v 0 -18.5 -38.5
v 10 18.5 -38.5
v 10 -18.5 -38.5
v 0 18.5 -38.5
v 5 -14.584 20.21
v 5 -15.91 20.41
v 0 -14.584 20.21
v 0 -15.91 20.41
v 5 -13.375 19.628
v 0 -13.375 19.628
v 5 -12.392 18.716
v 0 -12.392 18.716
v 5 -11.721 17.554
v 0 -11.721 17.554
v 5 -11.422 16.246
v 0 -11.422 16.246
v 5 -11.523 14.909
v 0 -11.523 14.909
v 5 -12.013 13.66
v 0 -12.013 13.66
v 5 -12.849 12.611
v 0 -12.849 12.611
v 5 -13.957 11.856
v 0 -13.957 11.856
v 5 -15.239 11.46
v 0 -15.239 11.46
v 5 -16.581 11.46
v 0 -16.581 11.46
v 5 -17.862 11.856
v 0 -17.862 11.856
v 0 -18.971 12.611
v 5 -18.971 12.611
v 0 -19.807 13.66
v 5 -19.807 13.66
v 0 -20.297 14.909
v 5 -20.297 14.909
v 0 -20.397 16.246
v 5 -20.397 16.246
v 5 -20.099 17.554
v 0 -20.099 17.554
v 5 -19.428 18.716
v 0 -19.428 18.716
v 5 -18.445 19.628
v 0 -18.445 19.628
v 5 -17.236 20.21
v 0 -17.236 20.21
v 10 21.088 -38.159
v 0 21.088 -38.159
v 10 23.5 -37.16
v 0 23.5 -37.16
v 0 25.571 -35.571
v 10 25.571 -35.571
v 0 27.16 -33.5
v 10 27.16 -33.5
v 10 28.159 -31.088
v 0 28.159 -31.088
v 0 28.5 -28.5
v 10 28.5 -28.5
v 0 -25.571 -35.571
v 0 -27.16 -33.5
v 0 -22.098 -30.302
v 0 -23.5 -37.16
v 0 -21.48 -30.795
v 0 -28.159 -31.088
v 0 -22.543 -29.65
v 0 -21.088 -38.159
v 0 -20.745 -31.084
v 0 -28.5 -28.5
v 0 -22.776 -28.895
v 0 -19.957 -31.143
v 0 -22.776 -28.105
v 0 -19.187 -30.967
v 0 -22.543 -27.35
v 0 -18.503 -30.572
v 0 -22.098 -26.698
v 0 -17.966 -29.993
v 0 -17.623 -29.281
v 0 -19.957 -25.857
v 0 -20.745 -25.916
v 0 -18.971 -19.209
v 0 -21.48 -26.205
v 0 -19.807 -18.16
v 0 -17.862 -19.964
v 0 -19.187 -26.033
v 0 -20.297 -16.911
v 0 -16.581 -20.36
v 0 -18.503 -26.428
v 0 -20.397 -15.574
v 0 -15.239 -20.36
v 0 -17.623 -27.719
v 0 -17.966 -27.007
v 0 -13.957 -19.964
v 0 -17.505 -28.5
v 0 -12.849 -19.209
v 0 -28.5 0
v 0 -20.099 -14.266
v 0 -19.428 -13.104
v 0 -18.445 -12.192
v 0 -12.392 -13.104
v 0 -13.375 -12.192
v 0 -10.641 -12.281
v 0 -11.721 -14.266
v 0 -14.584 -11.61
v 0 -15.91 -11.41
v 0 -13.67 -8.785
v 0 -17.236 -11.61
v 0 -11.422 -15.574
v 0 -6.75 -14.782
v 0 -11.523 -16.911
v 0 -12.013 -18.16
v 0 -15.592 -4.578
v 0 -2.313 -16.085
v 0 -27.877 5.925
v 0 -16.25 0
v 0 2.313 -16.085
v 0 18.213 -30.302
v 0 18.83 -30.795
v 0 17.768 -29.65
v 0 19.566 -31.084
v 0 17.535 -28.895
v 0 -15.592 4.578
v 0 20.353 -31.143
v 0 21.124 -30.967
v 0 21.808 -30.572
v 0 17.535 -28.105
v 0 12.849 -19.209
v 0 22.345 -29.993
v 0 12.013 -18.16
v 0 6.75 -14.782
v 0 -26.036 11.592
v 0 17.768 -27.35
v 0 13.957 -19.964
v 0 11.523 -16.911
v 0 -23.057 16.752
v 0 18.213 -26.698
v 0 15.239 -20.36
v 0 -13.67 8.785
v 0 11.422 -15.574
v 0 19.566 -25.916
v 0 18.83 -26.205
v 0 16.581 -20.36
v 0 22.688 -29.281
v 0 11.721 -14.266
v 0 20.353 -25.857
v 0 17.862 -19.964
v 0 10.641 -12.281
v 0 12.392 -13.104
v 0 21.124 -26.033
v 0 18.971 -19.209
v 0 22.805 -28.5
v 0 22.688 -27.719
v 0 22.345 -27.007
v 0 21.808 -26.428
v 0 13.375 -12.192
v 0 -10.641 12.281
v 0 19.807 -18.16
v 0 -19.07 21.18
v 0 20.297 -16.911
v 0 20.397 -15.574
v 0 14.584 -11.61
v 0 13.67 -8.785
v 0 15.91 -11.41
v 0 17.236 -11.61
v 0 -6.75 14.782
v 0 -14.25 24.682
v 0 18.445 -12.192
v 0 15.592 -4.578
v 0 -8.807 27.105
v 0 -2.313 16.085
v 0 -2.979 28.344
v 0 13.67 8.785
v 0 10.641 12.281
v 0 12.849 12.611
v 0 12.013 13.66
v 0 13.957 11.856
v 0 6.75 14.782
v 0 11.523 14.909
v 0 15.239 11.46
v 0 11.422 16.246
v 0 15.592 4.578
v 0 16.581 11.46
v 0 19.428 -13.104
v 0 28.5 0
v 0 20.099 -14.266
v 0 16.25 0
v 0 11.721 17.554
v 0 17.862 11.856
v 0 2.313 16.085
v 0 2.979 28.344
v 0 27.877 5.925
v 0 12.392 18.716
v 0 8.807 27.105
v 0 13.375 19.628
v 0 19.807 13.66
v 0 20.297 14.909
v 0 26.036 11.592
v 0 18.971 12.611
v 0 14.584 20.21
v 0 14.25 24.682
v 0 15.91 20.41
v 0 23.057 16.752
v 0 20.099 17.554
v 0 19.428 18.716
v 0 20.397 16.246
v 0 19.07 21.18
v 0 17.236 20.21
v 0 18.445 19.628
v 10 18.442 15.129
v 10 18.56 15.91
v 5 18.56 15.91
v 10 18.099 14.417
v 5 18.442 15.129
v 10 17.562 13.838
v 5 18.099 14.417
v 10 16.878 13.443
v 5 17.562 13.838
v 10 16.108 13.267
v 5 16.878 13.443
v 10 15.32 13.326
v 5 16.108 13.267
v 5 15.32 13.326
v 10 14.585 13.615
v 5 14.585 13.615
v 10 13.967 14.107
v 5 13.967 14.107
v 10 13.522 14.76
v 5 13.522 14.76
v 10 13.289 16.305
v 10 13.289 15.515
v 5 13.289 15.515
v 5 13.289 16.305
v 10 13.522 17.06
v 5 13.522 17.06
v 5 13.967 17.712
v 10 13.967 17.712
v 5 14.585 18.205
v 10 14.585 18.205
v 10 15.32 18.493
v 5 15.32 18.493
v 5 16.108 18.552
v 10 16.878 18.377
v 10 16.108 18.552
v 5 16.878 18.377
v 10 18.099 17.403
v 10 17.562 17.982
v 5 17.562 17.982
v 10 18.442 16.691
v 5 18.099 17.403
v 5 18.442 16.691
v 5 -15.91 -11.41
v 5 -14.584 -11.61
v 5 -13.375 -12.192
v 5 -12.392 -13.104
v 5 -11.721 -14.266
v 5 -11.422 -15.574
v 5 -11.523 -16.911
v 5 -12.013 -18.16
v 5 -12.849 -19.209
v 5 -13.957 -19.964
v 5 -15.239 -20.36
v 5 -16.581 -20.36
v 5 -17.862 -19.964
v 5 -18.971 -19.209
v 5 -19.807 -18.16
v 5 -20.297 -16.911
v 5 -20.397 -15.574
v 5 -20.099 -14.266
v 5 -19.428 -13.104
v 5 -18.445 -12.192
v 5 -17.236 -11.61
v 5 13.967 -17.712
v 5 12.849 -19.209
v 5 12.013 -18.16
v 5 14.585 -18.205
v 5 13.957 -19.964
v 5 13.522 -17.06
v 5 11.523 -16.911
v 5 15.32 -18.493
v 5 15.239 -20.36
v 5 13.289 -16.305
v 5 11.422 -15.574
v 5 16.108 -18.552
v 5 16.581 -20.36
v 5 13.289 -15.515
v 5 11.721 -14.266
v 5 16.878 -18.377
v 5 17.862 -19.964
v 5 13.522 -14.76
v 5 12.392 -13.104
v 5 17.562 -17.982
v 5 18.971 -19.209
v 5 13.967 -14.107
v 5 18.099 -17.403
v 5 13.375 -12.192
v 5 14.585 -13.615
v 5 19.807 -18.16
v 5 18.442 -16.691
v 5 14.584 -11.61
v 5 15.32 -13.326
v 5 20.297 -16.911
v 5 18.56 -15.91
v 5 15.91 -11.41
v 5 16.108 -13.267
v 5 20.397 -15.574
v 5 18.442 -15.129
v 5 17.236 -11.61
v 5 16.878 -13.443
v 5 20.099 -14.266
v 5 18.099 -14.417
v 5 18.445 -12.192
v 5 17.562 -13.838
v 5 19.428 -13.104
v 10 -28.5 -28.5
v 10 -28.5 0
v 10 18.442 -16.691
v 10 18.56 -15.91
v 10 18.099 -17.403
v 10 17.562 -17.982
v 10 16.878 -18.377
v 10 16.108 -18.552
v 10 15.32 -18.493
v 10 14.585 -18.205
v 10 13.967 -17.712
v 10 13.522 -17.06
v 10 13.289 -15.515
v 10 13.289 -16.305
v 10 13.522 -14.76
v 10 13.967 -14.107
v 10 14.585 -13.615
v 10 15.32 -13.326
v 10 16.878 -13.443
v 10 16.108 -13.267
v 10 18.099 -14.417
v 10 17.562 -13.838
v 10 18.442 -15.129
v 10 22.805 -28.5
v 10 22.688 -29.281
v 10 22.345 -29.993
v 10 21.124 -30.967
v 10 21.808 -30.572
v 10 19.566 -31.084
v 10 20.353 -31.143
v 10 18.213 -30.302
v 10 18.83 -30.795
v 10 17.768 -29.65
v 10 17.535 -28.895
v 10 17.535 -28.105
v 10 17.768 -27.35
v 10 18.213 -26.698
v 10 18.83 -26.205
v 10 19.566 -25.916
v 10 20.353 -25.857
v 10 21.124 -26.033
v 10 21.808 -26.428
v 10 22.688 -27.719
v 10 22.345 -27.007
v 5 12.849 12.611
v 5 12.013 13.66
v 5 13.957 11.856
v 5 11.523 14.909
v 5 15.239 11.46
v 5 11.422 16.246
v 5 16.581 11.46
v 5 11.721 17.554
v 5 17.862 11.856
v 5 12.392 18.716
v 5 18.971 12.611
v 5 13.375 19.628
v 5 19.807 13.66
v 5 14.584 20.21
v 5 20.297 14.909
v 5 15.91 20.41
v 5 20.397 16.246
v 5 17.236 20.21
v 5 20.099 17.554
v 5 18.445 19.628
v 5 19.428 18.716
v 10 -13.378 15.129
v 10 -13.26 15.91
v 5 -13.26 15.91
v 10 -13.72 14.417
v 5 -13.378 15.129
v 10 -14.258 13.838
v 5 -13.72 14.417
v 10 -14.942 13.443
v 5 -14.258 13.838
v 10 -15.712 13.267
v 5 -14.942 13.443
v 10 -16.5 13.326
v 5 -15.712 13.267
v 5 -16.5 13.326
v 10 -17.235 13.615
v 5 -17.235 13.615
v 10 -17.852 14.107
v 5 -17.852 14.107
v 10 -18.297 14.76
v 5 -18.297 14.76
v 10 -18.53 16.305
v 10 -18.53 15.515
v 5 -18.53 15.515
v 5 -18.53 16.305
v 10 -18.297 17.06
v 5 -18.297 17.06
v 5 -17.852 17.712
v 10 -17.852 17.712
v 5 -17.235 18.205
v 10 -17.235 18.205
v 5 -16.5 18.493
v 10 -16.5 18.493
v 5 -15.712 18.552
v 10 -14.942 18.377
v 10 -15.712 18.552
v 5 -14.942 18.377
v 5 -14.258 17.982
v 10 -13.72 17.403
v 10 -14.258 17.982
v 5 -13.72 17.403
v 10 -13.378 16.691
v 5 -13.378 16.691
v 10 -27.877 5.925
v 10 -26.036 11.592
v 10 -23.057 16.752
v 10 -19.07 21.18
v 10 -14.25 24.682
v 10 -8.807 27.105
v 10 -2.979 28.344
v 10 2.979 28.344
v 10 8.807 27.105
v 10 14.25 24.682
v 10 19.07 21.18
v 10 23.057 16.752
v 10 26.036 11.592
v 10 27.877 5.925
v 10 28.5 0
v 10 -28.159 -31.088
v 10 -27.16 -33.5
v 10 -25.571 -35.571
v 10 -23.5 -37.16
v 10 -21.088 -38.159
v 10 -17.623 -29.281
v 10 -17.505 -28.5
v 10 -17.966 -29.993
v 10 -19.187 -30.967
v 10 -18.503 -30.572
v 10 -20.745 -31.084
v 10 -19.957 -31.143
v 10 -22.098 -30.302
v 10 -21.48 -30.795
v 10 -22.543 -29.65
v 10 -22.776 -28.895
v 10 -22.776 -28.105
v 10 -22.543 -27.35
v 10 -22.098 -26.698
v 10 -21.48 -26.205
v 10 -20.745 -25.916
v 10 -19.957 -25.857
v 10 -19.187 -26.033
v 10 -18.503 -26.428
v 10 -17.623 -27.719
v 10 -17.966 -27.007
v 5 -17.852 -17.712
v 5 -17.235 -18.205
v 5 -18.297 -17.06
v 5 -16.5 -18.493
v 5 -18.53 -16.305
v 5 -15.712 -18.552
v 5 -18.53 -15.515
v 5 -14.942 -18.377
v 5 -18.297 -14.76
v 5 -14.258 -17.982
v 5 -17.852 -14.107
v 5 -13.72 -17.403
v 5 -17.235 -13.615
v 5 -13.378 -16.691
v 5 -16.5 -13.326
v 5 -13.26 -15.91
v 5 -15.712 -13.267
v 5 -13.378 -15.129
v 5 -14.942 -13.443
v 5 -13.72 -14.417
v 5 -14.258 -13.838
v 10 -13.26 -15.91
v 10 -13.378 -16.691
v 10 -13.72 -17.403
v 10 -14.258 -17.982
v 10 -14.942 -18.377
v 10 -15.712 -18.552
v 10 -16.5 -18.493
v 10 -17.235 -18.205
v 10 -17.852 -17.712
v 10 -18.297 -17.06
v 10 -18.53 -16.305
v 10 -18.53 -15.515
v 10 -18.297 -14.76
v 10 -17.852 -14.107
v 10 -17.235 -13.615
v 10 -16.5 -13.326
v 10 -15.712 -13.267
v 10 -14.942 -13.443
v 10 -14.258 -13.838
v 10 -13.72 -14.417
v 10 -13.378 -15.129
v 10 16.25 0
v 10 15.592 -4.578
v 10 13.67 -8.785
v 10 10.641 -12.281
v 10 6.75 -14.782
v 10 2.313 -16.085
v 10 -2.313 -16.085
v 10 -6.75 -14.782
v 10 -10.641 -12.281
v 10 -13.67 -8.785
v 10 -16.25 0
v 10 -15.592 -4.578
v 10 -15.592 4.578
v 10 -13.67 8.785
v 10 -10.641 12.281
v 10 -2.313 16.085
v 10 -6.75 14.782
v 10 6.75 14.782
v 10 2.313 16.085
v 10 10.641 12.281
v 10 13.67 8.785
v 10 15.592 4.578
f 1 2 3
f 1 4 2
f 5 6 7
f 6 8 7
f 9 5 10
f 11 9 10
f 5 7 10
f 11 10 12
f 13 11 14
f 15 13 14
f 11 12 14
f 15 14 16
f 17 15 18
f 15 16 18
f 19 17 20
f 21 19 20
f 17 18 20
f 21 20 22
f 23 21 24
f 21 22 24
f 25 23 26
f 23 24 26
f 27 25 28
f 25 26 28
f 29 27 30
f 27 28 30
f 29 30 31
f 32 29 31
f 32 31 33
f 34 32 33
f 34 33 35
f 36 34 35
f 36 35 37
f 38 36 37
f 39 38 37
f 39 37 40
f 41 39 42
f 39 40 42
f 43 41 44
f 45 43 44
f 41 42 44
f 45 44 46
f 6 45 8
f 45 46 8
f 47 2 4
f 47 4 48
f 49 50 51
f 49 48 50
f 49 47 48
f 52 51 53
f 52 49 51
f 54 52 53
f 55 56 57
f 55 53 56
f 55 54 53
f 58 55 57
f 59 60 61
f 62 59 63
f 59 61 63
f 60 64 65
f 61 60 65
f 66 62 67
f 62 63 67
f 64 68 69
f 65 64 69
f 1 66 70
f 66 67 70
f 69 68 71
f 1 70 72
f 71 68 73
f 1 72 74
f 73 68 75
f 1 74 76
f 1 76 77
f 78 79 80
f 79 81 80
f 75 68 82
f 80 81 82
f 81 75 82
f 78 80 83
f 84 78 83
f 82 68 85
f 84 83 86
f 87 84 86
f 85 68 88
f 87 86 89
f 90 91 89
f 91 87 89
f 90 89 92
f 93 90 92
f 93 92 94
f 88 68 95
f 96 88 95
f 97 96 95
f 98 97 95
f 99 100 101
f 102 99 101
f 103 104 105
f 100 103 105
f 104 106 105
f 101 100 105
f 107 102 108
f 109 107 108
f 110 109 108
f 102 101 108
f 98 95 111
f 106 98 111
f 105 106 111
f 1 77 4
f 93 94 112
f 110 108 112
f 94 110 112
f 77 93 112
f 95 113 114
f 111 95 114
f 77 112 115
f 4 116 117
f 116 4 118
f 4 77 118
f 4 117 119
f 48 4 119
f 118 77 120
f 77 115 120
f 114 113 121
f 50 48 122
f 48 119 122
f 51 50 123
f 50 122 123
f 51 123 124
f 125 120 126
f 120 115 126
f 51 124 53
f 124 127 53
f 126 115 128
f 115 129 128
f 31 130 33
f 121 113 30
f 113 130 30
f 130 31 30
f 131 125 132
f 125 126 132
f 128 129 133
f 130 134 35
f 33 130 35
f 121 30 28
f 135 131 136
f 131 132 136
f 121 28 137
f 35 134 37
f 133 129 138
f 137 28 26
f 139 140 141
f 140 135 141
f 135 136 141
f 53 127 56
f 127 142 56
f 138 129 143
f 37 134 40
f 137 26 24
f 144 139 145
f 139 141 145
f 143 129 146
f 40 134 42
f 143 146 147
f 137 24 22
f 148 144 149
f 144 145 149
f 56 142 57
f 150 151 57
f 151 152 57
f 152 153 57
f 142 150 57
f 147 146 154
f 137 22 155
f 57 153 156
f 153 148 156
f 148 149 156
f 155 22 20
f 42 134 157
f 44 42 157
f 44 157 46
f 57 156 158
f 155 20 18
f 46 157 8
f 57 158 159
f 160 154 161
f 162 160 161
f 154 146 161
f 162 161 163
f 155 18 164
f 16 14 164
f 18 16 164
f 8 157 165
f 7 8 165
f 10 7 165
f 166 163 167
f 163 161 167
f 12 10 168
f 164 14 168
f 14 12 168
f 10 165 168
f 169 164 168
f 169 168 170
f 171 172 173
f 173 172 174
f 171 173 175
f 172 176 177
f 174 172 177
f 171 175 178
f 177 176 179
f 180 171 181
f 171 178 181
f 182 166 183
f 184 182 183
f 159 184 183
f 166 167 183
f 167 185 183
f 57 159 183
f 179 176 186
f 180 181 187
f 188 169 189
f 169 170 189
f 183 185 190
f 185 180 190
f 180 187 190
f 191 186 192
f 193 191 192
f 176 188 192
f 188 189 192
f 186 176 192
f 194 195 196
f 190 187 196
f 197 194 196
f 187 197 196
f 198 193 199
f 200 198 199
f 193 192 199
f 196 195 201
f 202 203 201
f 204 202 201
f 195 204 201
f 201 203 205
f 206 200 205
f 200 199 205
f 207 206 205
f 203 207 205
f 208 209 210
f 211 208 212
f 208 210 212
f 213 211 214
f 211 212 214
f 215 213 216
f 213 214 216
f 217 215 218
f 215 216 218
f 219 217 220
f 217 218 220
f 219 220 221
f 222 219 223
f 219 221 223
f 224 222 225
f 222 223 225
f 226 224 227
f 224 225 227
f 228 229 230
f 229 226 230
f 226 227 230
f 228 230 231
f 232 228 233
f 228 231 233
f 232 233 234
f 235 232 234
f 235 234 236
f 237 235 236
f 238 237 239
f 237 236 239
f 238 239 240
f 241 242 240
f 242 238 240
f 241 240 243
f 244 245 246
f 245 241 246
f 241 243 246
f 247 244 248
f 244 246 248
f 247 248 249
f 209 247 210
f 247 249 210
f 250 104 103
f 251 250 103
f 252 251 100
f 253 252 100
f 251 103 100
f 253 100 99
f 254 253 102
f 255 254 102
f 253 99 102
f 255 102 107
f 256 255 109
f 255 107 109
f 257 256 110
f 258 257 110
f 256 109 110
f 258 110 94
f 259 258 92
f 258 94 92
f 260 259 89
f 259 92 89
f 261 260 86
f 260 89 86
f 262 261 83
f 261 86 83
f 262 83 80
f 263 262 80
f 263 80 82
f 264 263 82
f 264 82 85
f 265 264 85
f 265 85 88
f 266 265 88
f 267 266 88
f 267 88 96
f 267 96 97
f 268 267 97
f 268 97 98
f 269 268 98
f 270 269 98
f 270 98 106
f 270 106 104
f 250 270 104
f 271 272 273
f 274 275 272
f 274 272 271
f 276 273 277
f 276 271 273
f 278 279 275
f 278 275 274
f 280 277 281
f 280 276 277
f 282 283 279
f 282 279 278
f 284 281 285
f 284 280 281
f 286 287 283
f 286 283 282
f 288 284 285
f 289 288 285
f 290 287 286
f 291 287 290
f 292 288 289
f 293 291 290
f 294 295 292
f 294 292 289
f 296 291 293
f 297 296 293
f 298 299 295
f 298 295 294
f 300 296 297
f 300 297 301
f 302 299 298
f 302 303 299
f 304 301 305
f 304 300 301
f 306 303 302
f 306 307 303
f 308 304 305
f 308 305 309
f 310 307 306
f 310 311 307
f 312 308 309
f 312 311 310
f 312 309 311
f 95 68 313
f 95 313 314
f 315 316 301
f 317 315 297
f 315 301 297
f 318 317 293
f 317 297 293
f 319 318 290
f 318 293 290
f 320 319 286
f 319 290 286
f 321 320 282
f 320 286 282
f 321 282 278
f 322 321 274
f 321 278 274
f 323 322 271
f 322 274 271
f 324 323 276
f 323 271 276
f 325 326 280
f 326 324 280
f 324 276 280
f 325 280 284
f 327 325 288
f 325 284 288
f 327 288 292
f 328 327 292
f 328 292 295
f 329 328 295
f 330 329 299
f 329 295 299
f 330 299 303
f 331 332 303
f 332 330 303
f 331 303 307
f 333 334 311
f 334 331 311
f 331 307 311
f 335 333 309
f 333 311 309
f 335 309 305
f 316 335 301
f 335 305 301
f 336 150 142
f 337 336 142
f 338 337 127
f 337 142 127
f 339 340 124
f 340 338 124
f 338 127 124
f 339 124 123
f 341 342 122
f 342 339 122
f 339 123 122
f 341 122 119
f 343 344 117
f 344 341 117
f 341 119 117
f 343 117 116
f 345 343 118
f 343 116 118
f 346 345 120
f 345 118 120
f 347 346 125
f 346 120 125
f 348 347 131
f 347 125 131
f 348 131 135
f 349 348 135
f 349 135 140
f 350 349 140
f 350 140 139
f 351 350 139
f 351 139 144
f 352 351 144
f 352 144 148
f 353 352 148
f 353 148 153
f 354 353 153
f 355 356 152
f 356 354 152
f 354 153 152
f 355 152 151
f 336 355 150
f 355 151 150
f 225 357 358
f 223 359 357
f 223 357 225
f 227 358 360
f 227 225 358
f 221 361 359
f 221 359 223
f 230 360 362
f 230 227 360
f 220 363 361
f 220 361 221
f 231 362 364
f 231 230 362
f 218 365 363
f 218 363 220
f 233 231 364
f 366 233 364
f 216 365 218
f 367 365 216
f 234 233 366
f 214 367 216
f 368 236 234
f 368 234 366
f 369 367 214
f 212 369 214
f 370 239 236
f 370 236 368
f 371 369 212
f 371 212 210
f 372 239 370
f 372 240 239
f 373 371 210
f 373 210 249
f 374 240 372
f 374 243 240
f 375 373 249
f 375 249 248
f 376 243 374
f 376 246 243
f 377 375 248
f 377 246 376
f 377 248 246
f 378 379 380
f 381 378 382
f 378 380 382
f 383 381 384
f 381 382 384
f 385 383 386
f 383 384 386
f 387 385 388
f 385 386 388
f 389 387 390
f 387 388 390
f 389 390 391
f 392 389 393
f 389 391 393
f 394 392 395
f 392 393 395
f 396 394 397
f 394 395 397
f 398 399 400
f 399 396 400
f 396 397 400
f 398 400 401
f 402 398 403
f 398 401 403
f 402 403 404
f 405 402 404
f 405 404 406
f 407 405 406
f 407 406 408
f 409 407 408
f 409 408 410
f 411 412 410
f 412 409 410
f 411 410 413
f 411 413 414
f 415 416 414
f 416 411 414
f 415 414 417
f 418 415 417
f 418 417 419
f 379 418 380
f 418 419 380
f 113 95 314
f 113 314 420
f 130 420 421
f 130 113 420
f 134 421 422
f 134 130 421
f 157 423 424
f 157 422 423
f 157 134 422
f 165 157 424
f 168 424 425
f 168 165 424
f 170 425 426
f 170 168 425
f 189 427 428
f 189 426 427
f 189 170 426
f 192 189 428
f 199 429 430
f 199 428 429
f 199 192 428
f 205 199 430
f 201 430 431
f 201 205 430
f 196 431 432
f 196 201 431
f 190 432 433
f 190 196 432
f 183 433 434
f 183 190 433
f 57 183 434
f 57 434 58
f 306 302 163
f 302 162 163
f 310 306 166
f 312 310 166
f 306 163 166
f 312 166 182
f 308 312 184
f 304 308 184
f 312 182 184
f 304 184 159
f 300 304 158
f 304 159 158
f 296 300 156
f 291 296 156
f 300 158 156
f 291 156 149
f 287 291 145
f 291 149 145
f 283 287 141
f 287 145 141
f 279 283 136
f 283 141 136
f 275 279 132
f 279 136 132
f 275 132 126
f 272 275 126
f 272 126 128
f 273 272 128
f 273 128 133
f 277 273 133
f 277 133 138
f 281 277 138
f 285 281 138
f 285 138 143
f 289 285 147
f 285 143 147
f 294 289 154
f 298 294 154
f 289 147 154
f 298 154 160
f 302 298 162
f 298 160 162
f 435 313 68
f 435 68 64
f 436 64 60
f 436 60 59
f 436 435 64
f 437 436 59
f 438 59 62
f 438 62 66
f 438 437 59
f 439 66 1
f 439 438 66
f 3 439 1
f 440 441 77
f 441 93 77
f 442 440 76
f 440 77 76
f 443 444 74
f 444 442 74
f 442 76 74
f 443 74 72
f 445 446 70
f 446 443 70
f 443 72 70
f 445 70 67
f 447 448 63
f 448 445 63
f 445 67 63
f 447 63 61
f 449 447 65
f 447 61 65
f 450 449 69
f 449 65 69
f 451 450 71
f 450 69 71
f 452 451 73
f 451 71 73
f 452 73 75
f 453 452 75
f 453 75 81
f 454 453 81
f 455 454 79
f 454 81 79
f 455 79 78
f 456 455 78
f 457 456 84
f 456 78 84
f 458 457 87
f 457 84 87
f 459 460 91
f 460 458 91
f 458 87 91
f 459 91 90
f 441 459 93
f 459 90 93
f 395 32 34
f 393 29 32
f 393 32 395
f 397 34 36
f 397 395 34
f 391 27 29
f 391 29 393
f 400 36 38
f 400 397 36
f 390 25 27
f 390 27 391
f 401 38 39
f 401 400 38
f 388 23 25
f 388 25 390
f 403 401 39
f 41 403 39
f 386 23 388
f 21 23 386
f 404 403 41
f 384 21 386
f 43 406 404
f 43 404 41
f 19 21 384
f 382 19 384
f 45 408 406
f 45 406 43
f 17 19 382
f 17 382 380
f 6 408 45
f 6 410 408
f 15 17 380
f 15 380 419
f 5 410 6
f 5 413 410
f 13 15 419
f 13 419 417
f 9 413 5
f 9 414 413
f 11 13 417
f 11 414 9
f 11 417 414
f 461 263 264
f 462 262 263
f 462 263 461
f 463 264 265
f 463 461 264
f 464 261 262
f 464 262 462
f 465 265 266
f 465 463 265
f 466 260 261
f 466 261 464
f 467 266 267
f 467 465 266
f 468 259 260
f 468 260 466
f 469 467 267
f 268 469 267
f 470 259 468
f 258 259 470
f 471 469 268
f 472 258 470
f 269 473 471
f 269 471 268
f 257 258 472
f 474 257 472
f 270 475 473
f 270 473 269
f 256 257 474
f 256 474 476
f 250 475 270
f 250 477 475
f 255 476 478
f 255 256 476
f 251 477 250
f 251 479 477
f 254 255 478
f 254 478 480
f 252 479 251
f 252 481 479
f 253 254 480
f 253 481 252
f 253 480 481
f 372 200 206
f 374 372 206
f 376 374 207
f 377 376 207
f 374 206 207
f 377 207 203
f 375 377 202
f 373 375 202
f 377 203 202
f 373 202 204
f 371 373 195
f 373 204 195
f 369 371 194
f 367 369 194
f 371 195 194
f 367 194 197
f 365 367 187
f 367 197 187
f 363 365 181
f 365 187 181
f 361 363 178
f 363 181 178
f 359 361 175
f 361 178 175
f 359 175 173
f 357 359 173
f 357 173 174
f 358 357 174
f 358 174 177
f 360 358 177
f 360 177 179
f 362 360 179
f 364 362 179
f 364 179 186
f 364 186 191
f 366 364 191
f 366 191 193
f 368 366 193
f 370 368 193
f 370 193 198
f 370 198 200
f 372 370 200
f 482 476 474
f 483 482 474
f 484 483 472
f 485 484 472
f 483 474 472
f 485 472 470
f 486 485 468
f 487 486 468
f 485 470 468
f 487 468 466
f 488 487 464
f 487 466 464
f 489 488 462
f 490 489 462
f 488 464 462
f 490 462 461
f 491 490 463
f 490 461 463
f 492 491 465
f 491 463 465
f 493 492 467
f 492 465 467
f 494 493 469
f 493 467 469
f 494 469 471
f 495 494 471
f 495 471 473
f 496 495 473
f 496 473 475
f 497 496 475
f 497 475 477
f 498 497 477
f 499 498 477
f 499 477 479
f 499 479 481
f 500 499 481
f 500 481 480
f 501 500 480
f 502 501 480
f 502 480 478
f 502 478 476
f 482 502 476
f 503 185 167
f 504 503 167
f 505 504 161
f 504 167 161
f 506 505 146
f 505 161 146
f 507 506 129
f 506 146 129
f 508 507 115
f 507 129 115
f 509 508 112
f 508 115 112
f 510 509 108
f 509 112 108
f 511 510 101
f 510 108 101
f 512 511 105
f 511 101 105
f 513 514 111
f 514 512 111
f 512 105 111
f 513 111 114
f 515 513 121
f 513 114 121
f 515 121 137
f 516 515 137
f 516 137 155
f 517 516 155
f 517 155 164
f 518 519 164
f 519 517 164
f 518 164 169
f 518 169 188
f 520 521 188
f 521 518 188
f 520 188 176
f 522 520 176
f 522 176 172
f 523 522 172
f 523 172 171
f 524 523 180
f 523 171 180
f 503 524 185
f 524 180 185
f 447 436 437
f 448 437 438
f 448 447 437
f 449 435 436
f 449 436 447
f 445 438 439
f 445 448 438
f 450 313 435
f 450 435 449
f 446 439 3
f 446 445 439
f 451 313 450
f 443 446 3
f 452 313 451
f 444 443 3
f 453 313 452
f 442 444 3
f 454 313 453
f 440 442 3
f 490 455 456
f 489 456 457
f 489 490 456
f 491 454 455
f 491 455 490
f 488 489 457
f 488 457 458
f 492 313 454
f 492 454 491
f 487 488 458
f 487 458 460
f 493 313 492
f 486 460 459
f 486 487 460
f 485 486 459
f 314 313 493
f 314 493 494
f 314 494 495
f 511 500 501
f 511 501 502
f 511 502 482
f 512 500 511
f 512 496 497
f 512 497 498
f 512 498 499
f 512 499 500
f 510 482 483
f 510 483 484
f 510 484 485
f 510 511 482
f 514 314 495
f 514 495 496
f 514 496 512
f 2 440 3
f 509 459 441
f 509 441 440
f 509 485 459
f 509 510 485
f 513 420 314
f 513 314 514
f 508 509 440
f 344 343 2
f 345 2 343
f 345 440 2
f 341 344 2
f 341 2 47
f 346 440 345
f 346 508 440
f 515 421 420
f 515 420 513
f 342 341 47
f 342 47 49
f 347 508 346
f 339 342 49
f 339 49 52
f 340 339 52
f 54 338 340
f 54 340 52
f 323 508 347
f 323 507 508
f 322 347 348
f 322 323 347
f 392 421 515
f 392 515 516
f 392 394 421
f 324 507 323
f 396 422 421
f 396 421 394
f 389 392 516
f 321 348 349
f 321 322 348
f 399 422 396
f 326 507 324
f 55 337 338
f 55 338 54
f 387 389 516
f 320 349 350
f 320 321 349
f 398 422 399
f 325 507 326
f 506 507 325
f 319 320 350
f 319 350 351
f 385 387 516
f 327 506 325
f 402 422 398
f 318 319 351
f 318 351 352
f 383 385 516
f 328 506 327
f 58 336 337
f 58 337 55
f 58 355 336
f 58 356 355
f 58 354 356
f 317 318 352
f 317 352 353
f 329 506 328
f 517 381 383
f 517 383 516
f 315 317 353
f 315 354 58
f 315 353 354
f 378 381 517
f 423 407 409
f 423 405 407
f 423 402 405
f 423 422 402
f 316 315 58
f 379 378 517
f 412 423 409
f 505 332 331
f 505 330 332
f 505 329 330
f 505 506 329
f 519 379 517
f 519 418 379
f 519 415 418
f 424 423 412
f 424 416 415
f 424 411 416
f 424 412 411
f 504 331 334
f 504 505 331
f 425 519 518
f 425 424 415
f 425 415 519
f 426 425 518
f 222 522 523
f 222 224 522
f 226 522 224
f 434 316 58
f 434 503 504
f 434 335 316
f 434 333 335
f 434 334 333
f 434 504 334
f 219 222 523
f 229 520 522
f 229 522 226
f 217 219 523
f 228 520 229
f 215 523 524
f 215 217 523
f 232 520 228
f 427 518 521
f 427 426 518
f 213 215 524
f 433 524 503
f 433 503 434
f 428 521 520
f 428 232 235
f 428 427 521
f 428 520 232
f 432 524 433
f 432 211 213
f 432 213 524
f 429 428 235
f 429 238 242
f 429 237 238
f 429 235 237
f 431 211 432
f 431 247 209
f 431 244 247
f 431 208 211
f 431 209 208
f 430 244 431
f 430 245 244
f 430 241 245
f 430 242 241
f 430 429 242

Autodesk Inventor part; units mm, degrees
ref_plane "YZ Plane" through (0, 0, 0) normal (1, 0, 0) x (0, 1, 0)
ref_plane "XZ Plane" through (0, 0, 0) normal (0, 1, 0) x (-1, 0, 0)
ref_plane "XY Plane" through (0, 0, 0) normal (0, 0, 1) x (1, 0, 0)
sketch "Sketch1" plane through (0, 0, 0) normal (1, 0, 0) x (0, 1, 0)
  circle A0 centre (0, 0) radius 22.5 construction
  circle A1 centre (0, 0) radius 16.25
  circle A2 centre (0, 0) radius 28.5
  circle A3 centre (15.9099, 15.9099) radius 2.65
  line L0 (15.9099, 15.9099) -> (0, 0) construction
  circle A4 centre (-15.9099, 15.9099) radius 2.65
  circle A5 centre (-15.9099, -15.9099) radius 2.65
  circle A6 centre (15.9099, -15.9099) radius 2.65
  line L1 (28.5, 0) -> (28.5, -38.5)
  line L2 (28.5, -38.5) -> (-28.5, -38.5)
  line L3 (-28.5, -38.5) -> (-28.5, 0)
  line L4 (28.5, -18.5) -> (-28.5, -18.5)
  line L5 (-28.5, -28.5) -> (-20.1554, -28.5) construction
  line L6 (-20.1554, -28.5) -> (-11.8108, -28.5) construction
  line L7 (20.1554, -28.5) -> (28.5, -28.5) construction
  circle A7 centre (20.1554, -28.5) radius 2.65
  circle A8 centre (-20.1554, -28.5) radius 2.65
  line L8 (0, 0) -> (0, 13.3225) construction
  line L9 (-28.5, -28.5) -> (-20.1554, -28.5) construction
  line L10 (20.1554, -28.5) -> (16.456, -23.2691) construction
  point P0 (-17.3108, 22.6404)
  point P1 (-26.3306, -10.9065)
  point P2 (28.5, 0)
  dimension "d0" = 45
  dimension "d1" = 32.5
  dimension "d2" = 57
  dimension "d3" = 5.3
  dimension "d6" = 360
  dimension "d12" = 20
  dimension "d22" = 5.3
  dimension "d23" = 10
  dimension "d24" = 45
  dimension "d27" = 10
  dimension "d28" = 8.3446
extrude "Extrusion1" add sketch "Sketch1" along normal blind 10 contours A2 L4 A6 A5 | L1 L4 A2 | A2 L4 L3 | L4 L1 L2 L3 A2 | A2 L4 A5 A6
fillet "Fillet1" radius 10 4 edges at (5, 28.5, -38.5) (5, -28.5, -38.5) (5, -28.5, 0) (5, 28.5, 0)
sketch "Sketch2" plane through (0, 0, 0) normal (-1, 0, 0) x (0, 0, 1)
  arc A0 (-38.5, -18.5) -> (-28.5, -28.5) centre (-28.5, -18.5) ccw projected
  line L0 (0, -28.5) -> (-28.5, -28.5) projected
  arc A1 (0, -28.5) -> (0, 28.5) centre (0, 0) ccw projected
  line L1 (-28.5, 28.5) -> (0, 28.5) projected
  arc A2 (-28.5, 28.5) -> (-38.5, 18.5) centre (-28.5, 18.5) ccw projected
  line L2 (-38.5, -18.5) -> (-38.5, 18.5) projected
  circle A3 centre (-28.5, 20.1554) radius 2.65 projected
  circle A4 centre (-28.5, -20.1554) radius 2.65 projected
  circle A5 centre (-15.9099, 15.9099) radius 2.65 projected
  circle A6 centre (-15.9099, -15.9099) radius 2.65 projected
  circle A7 centre (15.9099, -15.9099) radius 2.65 projected
  circle A8 centre (15.9099, 15.9099) radius 2.65 projected
  circle A9 centre (0, 0) radius 16.25 projected
  circle A10 centre (-15.9099, 15.9099) radius 2.65 projected
  circle A11 centre (-15.9099, 15.9099) radius 4.5
  circle A12 centre (-15.9099, -15.9099) radius 2.65 projected
  circle A13 centre (-15.9099, -15.9099) radius 4.5
  circle A14 centre (15.9099, -15.9099) radius 2.65 projected
  circle A15 centre (15.9099, -15.9099) radius 4.5
  circle A16 centre (15.9099, 15.9099) radius 2.65 projected
  circle A17 centre (15.9099, 15.9099) radius 4.5
  dimension "d29" = 9
  dimension "d30" = 9
  dimension "d31" = 9
  dimension "d32" = 9
extrude "Extrusion2" cut sketch "Sketch2" against normal blind 5 contours A5 | A6 | A7 | A8 | A11 | A13 | A15 | A17
properties part number "Soporte motor"
